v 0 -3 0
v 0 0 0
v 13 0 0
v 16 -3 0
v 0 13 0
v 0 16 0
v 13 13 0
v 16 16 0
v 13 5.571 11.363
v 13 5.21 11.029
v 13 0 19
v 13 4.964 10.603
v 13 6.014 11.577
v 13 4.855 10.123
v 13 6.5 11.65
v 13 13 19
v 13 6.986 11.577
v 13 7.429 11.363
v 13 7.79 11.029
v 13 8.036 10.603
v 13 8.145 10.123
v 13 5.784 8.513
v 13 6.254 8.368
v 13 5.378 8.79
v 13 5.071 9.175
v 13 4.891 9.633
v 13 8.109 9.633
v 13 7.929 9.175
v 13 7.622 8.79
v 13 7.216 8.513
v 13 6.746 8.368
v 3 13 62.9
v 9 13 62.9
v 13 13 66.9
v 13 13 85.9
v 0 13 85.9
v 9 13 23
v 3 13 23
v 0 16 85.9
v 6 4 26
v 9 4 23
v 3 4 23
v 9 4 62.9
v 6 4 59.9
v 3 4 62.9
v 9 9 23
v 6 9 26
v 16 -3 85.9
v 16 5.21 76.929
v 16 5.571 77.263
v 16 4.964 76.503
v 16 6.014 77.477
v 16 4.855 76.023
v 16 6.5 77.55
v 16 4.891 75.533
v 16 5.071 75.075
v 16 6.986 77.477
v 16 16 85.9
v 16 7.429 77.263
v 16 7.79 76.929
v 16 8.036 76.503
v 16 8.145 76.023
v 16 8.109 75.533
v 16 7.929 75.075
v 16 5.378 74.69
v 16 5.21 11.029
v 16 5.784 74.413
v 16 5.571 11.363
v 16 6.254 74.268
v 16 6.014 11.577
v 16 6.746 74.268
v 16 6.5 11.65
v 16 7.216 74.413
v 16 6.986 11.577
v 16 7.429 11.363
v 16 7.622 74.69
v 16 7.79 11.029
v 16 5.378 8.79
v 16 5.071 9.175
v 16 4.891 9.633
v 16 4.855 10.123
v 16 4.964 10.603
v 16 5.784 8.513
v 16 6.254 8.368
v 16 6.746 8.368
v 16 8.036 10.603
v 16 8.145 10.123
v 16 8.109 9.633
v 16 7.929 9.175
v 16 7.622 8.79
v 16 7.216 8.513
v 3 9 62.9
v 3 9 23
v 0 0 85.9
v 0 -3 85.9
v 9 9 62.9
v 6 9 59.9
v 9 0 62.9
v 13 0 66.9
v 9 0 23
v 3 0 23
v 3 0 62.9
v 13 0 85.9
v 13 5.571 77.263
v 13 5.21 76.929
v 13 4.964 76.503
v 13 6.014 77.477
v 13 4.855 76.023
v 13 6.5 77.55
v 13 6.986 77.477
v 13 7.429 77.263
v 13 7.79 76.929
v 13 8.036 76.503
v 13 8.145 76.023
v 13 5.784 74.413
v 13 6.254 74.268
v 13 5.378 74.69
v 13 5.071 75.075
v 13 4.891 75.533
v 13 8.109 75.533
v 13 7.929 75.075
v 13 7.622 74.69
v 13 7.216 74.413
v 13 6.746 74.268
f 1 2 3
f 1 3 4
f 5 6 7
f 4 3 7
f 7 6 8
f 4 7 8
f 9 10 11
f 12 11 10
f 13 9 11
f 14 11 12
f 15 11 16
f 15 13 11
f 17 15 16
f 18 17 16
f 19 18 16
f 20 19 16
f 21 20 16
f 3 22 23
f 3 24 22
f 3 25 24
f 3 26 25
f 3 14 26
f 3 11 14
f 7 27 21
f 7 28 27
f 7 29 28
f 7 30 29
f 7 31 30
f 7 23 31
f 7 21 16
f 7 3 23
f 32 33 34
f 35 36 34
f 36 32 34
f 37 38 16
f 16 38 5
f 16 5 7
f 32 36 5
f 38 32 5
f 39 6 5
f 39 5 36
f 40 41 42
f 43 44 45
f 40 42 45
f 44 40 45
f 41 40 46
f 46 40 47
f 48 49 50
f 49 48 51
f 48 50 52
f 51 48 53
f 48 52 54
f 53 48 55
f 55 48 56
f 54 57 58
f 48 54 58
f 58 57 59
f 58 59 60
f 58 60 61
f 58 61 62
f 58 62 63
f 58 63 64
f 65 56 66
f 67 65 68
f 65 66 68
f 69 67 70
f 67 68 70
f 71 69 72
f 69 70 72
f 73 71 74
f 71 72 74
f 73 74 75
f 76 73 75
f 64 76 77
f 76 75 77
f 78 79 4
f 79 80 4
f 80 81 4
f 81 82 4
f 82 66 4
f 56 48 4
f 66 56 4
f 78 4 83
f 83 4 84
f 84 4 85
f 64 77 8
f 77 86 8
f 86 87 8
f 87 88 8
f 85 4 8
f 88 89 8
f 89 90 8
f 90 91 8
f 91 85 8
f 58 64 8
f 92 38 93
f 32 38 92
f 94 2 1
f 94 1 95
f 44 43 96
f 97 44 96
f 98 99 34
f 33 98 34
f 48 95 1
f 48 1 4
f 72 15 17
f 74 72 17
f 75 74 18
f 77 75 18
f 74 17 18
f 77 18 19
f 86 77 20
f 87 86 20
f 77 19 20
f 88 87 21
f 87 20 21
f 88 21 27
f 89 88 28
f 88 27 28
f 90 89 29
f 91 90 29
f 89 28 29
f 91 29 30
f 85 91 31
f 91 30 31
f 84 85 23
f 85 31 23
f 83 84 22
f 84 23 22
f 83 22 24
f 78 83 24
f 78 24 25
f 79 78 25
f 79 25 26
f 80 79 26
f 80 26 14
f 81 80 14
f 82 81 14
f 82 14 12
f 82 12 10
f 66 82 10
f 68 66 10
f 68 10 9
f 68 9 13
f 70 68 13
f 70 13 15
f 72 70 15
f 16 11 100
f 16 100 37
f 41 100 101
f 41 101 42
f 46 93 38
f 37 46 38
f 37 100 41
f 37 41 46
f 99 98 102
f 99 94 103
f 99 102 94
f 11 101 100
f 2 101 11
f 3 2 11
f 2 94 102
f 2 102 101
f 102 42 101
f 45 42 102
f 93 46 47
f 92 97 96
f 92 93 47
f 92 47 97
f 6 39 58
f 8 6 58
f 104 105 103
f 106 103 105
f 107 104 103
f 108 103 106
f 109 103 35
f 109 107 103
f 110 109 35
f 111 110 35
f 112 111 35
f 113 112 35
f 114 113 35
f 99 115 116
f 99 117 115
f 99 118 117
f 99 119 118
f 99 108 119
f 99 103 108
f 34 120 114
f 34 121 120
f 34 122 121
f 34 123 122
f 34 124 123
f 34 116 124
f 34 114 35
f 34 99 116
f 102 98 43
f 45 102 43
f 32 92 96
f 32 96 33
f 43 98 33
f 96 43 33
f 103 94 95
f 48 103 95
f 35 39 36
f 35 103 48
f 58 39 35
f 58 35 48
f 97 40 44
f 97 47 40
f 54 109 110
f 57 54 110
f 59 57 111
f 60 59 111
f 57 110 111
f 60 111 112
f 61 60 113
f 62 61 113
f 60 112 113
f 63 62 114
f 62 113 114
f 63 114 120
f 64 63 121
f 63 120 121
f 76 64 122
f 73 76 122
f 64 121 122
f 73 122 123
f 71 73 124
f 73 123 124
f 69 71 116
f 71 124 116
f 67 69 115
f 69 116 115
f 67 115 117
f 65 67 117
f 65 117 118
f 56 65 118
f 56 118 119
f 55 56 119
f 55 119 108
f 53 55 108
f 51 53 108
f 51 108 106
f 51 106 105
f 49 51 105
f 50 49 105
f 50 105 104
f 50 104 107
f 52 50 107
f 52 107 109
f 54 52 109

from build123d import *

# Parameters (mm, degrees)
SKETCH_1_W          = 19
SKETCH_1_H          = 19
SKETCH_1_W_2        = 13
SKETCH_1_H_2        = 13
EXTRUDE_1_DEPTH     = 85.9
SKETCH_2_R          = 1.65
CUT_EXTRUDE_1_DEPTH = 30
SKETCH_3_W          = 116.915177823
SKETCH_3_H          = 46.219516436
CUT_EXTRUDE_2_DEPTH = 3
SKETCH_4_W          = 5
SKETCH_4_H          = 13
EXTRUDE_1_2_DEPTH   = 10
SKETCH_5_W          = 29.9
SKETCH_5_H          = 5
EXTRUDE_2_DEPTH     = 10
SKETCH_6_W          = 39.9
SKETCH_6_H          = 13
EXTRUDE_3_DEPTH     = 10
SKETCH_8_W          = 39.9
SKETCH_8_H          = 5
CUT_EXTRUDE_3_DEPTH = 3
CHAMFER_1_SIZE      = 3
CHAMFER_2_SIZE      = 4


with BuildPart() as part:
    # 草图1 → Extrude 1 (new body)
    with BuildSketch(Plane.XY):
        with Locations((6.5, 6.5)):
            Rectangle(SKETCH_1_W, SKETCH_1_H)
        with Locations((6.5, 6.5)):
            Rectangle(SKETCH_1_W_2, SKETCH_1_H_2, mode=Mode.SUBTRACT)
    extrude(amount=EXTRUDE_1_DEPTH)

    # 草图2 → 切除-拉伸1 (cut)
    with BuildSketch(Plane.ZY.offset(3)):
        with Locations((10, 6.5)):
            Circle(SKETCH_2_R)
        with Locations((75.9, 6.5)):
            Circle(SKETCH_2_R)
    extrude(amount=-CUT_EXTRUDE_1_DEPTH, mode=Mode.SUBTRACT)

    # 草图3 → 切除-拉伸2 (cut)
    with BuildSketch(Plane.ZY.offset(3)):
        with Locations((53.162237228, 0.202739406)):
            Rectangle(SKETCH_3_W, SKETCH_3_H)
    extrude(amount=-CUT_EXTRUDE_2_DEPTH, mode=Mode.SUBTRACT)

    # 草图4 → Extrude 1 2 (add)
    with BuildSketch(Plane.ZY.offset(-13)):
        with Locations((25.5, 6.5)):
            Rectangle(SKETCH_4_W, SKETCH_4_H)
        with Locations((60.4, 6.5)):
            Rectangle(SKETCH_4_W, SKETCH_4_H)
    extrude(amount=EXTRUDE_1_2_DEPTH)

    # 草图5 → 凸台-拉伸2 (add)
    with BuildSketch(Plane.ZY.offset(-13)):
        with Locations((42.95, 6.5)):
            Rectangle(SKETCH_5_W, SKETCH_5_H)
    extrude(amount=EXTRUDE_2_DEPTH)

    # 草图6 → 凸台-拉伸3 (add)
    with BuildSketch(Plane.ZY.offset(-13)):
        with Locations((42.95, 6.5)):
            Rectangle(SKETCH_6_W, SKETCH_6_H)
    extrude(amount=EXTRUDE_3_DEPTH)

    # 草图8 → 切除-拉伸3 (cut)
    with BuildSketch(Plane.ZY.offset(-3)):
        with Locations((42.95, 6.5)):
            Rectangle(SKETCH_8_W, SKETCH_8_H)
    extrude(amount=-CUT_EXTRUDE_3_DEPTH, mode=Mode.SUBTRACT)

    # 倒角1
    chamfer_1_edges = [part.edges().sort_by_distance(p)[0] for p in [
        (6, 6.5, 23),
        (6, 6.5, 62.9),
    ]]
    chamfer(chamfer_1_edges, length=CHAMFER_1_SIZE)

    # 倒角2
    chamfer_2_edges = [part.edges().sort_by_distance(p)[0] for p in [
        (13, 6.5, 23),
        (13, 6.5, 62.9),
    ]]
    chamfer(chamfer_2_edges, length=CHAMFER_2_SIZE - 0.0001)  # a hair under: the kernel refuses the full size


solid = part.part
